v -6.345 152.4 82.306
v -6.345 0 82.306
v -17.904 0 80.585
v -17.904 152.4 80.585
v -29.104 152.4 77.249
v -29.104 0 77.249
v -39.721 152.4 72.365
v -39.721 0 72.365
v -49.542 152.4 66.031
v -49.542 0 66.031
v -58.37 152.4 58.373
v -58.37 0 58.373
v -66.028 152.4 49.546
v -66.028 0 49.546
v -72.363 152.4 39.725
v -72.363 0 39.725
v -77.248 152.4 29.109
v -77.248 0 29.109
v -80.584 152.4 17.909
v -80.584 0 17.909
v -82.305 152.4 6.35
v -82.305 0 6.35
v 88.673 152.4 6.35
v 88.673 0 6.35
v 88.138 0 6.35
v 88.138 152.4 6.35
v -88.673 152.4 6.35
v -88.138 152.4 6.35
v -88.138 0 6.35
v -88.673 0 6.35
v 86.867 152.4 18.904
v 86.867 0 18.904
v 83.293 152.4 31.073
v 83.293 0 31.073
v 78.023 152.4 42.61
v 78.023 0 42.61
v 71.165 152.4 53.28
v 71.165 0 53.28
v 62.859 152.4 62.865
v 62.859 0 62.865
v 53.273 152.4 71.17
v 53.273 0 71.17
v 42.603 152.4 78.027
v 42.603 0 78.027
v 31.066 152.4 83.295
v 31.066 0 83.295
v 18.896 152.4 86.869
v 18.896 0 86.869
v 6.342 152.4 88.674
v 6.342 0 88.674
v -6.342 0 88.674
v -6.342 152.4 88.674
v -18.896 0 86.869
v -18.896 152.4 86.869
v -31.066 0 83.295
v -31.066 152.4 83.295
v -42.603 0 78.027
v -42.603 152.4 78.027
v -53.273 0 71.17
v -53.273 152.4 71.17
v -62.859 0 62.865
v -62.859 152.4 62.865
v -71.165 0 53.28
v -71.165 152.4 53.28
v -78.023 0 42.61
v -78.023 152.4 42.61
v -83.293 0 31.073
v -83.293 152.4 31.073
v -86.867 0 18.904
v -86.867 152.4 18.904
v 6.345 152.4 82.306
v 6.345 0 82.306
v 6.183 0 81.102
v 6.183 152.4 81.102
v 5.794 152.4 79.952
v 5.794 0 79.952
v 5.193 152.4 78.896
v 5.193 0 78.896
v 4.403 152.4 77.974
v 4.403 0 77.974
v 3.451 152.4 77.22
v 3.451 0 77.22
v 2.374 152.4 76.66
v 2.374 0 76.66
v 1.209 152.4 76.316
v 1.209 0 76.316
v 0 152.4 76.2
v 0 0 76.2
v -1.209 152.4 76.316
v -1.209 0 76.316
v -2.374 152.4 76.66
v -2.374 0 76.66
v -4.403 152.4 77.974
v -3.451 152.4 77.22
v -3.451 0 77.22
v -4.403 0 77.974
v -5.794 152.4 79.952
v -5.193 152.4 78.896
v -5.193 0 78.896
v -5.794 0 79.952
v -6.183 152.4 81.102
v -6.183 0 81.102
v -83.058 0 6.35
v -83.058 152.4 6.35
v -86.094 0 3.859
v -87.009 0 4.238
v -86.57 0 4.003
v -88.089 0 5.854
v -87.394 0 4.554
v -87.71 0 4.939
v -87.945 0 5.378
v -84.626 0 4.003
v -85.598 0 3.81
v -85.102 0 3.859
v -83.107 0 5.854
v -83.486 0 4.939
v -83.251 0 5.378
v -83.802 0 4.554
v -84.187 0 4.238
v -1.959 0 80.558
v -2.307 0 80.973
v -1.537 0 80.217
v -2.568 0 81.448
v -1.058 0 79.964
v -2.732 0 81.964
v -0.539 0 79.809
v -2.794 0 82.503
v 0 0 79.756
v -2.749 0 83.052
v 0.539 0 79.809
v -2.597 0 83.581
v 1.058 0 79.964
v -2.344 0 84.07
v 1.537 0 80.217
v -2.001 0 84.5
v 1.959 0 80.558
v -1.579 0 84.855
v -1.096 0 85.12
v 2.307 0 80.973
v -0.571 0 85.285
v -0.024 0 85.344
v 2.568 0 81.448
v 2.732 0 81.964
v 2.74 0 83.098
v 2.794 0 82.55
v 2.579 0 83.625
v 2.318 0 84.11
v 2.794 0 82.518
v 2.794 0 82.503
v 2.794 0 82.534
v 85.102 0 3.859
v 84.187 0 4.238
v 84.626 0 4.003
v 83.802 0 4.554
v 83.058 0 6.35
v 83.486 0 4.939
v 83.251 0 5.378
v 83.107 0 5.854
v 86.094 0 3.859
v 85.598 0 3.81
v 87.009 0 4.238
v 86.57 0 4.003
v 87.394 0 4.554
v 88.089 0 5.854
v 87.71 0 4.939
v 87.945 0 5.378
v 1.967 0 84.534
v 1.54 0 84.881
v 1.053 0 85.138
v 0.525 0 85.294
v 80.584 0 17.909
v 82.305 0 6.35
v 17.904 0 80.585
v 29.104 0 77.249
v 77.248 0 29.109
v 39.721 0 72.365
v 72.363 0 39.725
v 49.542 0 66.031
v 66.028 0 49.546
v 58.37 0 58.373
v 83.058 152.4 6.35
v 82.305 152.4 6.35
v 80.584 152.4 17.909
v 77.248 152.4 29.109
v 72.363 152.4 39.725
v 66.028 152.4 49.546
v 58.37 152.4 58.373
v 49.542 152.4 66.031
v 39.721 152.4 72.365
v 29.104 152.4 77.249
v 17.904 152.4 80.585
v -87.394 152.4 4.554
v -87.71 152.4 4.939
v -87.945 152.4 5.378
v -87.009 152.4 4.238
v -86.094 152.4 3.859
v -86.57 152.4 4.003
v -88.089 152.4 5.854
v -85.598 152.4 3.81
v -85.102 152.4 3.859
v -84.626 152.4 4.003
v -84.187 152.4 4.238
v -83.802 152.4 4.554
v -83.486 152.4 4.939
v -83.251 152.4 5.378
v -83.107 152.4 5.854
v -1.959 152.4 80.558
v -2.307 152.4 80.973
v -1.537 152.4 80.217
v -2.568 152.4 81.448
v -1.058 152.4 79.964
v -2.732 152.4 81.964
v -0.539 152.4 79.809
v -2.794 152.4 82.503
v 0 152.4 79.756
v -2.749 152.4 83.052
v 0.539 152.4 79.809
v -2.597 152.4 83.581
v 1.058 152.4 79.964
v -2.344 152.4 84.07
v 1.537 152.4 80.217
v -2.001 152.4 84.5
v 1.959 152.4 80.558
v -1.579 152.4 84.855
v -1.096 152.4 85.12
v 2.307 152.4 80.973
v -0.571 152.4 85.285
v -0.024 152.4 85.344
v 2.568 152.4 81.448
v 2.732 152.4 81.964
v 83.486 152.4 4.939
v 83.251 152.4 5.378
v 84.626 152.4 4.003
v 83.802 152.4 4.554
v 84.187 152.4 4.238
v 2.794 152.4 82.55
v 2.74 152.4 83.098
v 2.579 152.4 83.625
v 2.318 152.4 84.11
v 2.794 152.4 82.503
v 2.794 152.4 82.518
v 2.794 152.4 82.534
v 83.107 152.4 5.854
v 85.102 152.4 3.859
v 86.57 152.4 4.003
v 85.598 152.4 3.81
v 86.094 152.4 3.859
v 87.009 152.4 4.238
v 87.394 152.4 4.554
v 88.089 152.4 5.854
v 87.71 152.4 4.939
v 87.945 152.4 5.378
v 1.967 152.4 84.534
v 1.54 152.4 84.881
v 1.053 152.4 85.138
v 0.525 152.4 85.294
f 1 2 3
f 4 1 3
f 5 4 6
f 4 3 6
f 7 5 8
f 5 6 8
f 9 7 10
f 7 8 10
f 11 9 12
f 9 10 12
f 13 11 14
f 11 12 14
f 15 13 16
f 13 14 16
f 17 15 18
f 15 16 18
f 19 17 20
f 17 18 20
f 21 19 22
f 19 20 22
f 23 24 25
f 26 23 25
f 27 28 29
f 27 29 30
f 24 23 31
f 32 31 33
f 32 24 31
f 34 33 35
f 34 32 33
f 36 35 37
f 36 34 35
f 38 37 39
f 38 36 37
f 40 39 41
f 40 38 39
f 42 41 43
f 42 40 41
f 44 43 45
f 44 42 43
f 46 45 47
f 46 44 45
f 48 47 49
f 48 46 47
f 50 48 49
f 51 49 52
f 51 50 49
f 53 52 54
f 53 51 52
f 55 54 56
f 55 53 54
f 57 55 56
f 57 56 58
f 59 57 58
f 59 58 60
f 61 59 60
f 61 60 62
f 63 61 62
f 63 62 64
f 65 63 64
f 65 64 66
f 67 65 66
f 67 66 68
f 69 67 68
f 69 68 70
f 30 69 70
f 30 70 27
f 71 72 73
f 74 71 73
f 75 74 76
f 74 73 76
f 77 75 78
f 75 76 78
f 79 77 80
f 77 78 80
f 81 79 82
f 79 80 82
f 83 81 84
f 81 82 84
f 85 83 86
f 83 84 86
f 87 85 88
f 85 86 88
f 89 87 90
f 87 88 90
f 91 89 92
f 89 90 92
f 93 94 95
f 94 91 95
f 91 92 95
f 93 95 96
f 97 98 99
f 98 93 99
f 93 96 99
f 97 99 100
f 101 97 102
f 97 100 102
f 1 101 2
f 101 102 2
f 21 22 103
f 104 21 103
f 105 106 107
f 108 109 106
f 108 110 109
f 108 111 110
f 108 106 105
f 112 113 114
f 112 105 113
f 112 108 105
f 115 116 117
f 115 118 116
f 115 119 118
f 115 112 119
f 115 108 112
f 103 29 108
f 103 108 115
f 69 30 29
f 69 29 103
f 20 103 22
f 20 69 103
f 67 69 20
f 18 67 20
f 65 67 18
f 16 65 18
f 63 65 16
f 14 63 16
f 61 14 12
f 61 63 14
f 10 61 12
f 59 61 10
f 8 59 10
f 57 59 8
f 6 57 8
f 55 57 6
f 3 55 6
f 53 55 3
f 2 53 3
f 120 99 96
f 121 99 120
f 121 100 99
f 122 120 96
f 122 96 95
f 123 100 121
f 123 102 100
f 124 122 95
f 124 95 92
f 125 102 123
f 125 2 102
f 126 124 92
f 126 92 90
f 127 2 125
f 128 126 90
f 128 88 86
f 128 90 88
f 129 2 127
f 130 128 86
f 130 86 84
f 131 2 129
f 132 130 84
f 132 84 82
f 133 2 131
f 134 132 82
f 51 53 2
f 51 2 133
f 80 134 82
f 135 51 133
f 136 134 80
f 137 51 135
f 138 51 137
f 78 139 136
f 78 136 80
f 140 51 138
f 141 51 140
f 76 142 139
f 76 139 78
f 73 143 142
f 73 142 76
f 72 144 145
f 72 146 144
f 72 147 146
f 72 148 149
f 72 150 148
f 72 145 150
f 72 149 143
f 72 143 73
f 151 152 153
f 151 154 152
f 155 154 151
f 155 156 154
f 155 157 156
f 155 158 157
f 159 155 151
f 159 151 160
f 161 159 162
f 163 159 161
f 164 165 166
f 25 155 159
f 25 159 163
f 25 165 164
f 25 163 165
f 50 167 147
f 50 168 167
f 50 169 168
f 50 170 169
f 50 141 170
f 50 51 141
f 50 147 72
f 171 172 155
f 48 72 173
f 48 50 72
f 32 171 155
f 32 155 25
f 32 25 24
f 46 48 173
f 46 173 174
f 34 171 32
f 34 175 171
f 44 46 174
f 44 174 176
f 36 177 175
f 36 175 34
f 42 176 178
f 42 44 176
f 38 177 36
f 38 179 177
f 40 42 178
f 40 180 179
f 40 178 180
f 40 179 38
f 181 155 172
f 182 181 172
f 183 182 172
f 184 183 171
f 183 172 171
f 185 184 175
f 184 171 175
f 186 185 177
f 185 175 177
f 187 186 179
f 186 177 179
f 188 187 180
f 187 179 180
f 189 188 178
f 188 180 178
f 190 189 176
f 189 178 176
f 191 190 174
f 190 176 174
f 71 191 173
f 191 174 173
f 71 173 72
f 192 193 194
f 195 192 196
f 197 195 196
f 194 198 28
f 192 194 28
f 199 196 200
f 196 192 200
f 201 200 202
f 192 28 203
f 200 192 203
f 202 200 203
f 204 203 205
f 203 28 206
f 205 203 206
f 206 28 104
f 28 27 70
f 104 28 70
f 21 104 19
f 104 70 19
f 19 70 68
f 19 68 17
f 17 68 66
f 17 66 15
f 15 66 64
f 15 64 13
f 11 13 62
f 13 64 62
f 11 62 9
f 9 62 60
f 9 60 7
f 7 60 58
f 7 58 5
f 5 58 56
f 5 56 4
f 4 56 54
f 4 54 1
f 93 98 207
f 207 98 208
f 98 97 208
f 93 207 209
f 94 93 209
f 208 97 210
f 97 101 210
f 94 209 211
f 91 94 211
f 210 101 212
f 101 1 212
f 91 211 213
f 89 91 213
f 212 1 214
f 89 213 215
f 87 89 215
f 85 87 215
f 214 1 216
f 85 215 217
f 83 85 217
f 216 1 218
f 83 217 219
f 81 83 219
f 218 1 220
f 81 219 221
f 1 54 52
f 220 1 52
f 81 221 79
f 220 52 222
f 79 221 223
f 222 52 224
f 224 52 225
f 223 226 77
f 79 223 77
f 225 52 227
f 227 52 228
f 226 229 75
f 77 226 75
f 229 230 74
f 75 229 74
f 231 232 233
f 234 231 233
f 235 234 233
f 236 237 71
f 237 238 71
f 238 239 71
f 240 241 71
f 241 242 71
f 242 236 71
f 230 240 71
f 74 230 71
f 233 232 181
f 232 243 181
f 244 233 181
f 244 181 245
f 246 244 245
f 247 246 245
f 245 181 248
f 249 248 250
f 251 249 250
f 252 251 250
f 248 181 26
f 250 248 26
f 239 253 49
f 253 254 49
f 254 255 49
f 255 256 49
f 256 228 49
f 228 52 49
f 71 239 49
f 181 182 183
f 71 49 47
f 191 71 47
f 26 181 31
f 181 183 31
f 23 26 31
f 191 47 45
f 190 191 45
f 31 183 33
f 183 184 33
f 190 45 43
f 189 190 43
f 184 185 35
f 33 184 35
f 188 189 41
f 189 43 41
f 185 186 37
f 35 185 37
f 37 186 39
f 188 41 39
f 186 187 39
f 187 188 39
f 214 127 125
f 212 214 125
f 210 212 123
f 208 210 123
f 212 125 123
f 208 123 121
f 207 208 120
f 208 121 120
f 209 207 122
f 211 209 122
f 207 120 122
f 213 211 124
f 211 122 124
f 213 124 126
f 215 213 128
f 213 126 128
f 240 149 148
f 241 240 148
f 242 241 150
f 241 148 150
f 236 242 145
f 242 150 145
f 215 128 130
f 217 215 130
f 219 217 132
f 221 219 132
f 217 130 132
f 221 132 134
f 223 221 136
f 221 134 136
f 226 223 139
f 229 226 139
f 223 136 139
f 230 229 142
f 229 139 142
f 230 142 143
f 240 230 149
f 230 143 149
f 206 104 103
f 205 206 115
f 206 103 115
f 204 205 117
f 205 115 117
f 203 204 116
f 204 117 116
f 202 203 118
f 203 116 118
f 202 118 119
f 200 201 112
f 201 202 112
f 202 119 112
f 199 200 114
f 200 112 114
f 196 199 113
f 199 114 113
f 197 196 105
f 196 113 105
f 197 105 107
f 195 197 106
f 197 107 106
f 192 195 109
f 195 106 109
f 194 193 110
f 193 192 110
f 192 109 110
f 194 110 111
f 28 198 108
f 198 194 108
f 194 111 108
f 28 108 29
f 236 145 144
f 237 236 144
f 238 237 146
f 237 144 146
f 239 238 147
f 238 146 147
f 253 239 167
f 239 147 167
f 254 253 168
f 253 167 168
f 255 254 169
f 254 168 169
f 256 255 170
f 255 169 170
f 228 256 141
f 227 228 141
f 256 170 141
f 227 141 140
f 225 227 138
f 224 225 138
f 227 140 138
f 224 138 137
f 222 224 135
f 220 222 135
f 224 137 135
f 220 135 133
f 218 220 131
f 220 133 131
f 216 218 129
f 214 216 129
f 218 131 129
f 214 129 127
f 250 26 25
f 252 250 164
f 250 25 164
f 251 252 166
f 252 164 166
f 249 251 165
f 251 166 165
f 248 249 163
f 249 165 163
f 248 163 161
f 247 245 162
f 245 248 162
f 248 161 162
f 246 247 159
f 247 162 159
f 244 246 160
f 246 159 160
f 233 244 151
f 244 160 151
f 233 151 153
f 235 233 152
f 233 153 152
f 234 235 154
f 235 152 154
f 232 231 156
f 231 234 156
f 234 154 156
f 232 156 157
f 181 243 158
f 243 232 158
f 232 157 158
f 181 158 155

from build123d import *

# Parameters (mm, degrees)
F0_R     = 88.9
F1_DEPTH = 152.4
F4_DEPTH = 152.401
F5_DEPTH = 152.401
F7_DEPTH = 152.401


with BuildPart() as f1:
    # F0 (on Front) → F1 (new body)
    with BuildSketch(Plane.XZ):
        Circle(F0_R)
    extrude(amount=-F1_DEPTH)

    # F3 (on face) → F4 (cut, through all)
    with BuildSketch(Plane.XZ):
        with BuildLine():
            ThreePointArc((6.3453015162, 82.3057692308), (0, 76.2), (-6.3453015162, 82.3057692308))
            ThreePointArc((-6.3453015162, 82.3057692308), (-58.3716647869, 58.3716647869), (-82.3057692308, 6.3453015162))
            ThreePointArc((-82.3057692308, 6.3453015162), (-77.974338005, 4.4029328075), (-76.2, 0))
            ThreePointArc((-76.2, 0), (-77.974338005, -4.4029328075), (-82.3057692308, -6.3453015162))
            ThreePointArc((-82.3057692308, -6.3453015162), (-58.3716647869, -58.3716647869), (-6.3453015162, -82.3057692308))
            ThreePointArc((-6.3453015162, -82.3057692308), (0, -76.2), (6.3453015162, -82.3057692308))
            ThreePointArc((6.3453015162, -82.3057692308), (58.3716647869, -58.3716647869), (82.3057692308, -6.3453015162))
            ThreePointArc((82.3057692308, -6.3453015162), (76.2, 0), (82.3057692308, 6.3453015162))
            ThreePointArc((82.3057692308, 6.3453015162), (58.3716647869, 58.3716647869), (6.3453015162, 82.3057692308))
        make_face()
    extrude(amount=-F4_DEPTH, mode=Mode.SUBTRACT)

    # F2 (on face) → F5 (cut, through all)
    with BuildSketch(Plane.XZ):
        with BuildLine():
            ThreePointArc((-2.7935998838, 82.5027169231), (-1.9588679235, 80.5576966952), (0, 79.756))
            ThreePointArc((0, 79.756), (1.9588679235, 80.5576966952), (2.7935998838, 82.5027169231))
            ThreePointArc((2.7935998838, 82.5027169231), (2.7938999692, 82.5263576151), (2.794, 82.55))
            ThreePointArc((2.794, 82.55), (-0.0236423849, 85.3438999692), (-2.7935998838, 82.5027169231))
        make_face()
        with BuildLine():
            ThreePointArc((-82.5027169231, 2.7935998838), (-85.344, 0), (-82.5027169231, -2.7935998838))
            ThreePointArc((-82.5027169231, -2.7935998838), (-80.5576966952, -1.9588679235), (-79.756, 0))
            ThreePointArc((-79.756, 0), (-80.5576966952, 1.9588679235), (-82.5027169231, 2.7935998838))
        make_face()
        with BuildLine():
            ThreePointArc((79.756, 0), (80.5576966952, -1.9588679235), (82.5027169231, -2.7935998838))
            ThreePointArc((82.5027169231, -2.7935998838), (84.5088679235, -1.9923033048), (85.344, 0))
            ThreePointArc((85.344, 0), (84.5088679235, 1.9923033048), (82.5027169231, 2.7935998838))
            ThreePointArc((82.5027169231, 2.7935998838), (80.5576966952, 1.9588679235), (79.756, 0))
        make_face()
        with BuildLine():
            ThreePointArc((2.794, -82.55), (2.7938999692, -82.5263576151), (2.7935998838, -82.5027169231))
            ThreePointArc((2.7935998838, -82.5027169231), (1.9588679235, -80.5576966952), (0, -79.756))
            ThreePointArc((0, -79.756), (-1.9588679235, -80.5576966952), (-2.7935998838, -82.5027169231))
            ThreePointArc((-2.7935998838, -82.5027169231), (-0.0236423849, -85.3438999692), (2.794, -82.55))
        make_face()
    extrude(amount=-F5_DEPTH, mode=Mode.SUBTRACT)

    # F6 (on face) → F7 (cut, through all)
    with BuildSketch(Plane.XZ):
        with BuildLine():
            Line((82.55, 0), (76.2, 0))
            ThreePointArc((76.2, 0), (77.974338005, -4.4029328075), (82.3057692308, -6.3453015162))
            ThreePointArc((82.3057692308, -6.3453015162), (58.3716647869, -58.3716647869), (6.3453015162, -82.3057692308))
            ThreePointArc((6.3453015162, -82.3057692308), (0, -76.2), (-6.3453015162, -82.3057692308))
            ThreePointArc((-6.3453015162, -82.3057692308), (-58.3716647869, -58.3716647869), (-82.3057692308, -6.3453015162))
            ThreePointArc((-82.3057692308, -6.3453015162), (-77.974338005, -4.4029328075), (-76.2, 0))
            Line((-76.2, 0), (-88.9, 0))
            Line((-88.9, 0), (-104.8936669013, -139.8783236514))
            Line((-104.8936669013, -139.8783236514), (114.9751045783, -122.2419444763))
            Line((114.9751045783, -122.2419444763), (88.9, 0))
            Line((88.9, 0), (82.55, 0))
        make_face()
        Polygon((88.9, 6.35), (88.9, 0), (114.9751045783, -122.2419444763), (179.3332546949, -117.0795708895), (106.4055040479, 6.35), align=None)
        with BuildLine():
            ThreePointArc((82.3057692308, 6.3453015162), (77.974338005, 4.4029328075), (76.2, 0))
            Line((76.2, 0), (82.55, 0))
            Line((82.55, 0), (88.9, 0))
            Line((88.9, 0), (88.9, 6.35))
            Line((88.9, 6.35), (88.138, 6.35))
            ThreePointArc((88.138, 6.35), (85.598, 3.81), (83.058, 6.35))
            Line((83.058, 6.35), (82.55, 6.35))
            Line((82.55, 6.35), (82.3054068698, 6.35))
            ThreePointArc((82.3054068698, 6.35), (82.3055880838, 6.3476507607), (82.3057692308, 6.3453015162))
        make_face()
        with BuildLine():
            Line((-88.9, 0), (-76.2, 0))
            ThreePointArc((-76.2, 0), (-77.974338005, 4.4029328075), (-82.3057692308, 6.3453015162))
            ThreePointArc((-82.3057692308, 6.3453015162), (-82.3055880838, 6.3476507607), (-82.3054068698, 6.35))
            Line((-82.3054068698, 6.35), (-82.55, 6.35))
            Line((-82.55, 6.35), (-83.058, 6.35))
            ThreePointArc((-83.058, 6.35), (-85.598, 3.81), (-88.138, 6.35))
            Line((-88.138, 6.35), (-88.9, 6.35))
            Line((-88.9, 6.35), (-88.9, 0))
        make_face()
    extrude(amount=-F7_DEPTH, mode=Mode.SUBTRACT)


solid = f1.part
